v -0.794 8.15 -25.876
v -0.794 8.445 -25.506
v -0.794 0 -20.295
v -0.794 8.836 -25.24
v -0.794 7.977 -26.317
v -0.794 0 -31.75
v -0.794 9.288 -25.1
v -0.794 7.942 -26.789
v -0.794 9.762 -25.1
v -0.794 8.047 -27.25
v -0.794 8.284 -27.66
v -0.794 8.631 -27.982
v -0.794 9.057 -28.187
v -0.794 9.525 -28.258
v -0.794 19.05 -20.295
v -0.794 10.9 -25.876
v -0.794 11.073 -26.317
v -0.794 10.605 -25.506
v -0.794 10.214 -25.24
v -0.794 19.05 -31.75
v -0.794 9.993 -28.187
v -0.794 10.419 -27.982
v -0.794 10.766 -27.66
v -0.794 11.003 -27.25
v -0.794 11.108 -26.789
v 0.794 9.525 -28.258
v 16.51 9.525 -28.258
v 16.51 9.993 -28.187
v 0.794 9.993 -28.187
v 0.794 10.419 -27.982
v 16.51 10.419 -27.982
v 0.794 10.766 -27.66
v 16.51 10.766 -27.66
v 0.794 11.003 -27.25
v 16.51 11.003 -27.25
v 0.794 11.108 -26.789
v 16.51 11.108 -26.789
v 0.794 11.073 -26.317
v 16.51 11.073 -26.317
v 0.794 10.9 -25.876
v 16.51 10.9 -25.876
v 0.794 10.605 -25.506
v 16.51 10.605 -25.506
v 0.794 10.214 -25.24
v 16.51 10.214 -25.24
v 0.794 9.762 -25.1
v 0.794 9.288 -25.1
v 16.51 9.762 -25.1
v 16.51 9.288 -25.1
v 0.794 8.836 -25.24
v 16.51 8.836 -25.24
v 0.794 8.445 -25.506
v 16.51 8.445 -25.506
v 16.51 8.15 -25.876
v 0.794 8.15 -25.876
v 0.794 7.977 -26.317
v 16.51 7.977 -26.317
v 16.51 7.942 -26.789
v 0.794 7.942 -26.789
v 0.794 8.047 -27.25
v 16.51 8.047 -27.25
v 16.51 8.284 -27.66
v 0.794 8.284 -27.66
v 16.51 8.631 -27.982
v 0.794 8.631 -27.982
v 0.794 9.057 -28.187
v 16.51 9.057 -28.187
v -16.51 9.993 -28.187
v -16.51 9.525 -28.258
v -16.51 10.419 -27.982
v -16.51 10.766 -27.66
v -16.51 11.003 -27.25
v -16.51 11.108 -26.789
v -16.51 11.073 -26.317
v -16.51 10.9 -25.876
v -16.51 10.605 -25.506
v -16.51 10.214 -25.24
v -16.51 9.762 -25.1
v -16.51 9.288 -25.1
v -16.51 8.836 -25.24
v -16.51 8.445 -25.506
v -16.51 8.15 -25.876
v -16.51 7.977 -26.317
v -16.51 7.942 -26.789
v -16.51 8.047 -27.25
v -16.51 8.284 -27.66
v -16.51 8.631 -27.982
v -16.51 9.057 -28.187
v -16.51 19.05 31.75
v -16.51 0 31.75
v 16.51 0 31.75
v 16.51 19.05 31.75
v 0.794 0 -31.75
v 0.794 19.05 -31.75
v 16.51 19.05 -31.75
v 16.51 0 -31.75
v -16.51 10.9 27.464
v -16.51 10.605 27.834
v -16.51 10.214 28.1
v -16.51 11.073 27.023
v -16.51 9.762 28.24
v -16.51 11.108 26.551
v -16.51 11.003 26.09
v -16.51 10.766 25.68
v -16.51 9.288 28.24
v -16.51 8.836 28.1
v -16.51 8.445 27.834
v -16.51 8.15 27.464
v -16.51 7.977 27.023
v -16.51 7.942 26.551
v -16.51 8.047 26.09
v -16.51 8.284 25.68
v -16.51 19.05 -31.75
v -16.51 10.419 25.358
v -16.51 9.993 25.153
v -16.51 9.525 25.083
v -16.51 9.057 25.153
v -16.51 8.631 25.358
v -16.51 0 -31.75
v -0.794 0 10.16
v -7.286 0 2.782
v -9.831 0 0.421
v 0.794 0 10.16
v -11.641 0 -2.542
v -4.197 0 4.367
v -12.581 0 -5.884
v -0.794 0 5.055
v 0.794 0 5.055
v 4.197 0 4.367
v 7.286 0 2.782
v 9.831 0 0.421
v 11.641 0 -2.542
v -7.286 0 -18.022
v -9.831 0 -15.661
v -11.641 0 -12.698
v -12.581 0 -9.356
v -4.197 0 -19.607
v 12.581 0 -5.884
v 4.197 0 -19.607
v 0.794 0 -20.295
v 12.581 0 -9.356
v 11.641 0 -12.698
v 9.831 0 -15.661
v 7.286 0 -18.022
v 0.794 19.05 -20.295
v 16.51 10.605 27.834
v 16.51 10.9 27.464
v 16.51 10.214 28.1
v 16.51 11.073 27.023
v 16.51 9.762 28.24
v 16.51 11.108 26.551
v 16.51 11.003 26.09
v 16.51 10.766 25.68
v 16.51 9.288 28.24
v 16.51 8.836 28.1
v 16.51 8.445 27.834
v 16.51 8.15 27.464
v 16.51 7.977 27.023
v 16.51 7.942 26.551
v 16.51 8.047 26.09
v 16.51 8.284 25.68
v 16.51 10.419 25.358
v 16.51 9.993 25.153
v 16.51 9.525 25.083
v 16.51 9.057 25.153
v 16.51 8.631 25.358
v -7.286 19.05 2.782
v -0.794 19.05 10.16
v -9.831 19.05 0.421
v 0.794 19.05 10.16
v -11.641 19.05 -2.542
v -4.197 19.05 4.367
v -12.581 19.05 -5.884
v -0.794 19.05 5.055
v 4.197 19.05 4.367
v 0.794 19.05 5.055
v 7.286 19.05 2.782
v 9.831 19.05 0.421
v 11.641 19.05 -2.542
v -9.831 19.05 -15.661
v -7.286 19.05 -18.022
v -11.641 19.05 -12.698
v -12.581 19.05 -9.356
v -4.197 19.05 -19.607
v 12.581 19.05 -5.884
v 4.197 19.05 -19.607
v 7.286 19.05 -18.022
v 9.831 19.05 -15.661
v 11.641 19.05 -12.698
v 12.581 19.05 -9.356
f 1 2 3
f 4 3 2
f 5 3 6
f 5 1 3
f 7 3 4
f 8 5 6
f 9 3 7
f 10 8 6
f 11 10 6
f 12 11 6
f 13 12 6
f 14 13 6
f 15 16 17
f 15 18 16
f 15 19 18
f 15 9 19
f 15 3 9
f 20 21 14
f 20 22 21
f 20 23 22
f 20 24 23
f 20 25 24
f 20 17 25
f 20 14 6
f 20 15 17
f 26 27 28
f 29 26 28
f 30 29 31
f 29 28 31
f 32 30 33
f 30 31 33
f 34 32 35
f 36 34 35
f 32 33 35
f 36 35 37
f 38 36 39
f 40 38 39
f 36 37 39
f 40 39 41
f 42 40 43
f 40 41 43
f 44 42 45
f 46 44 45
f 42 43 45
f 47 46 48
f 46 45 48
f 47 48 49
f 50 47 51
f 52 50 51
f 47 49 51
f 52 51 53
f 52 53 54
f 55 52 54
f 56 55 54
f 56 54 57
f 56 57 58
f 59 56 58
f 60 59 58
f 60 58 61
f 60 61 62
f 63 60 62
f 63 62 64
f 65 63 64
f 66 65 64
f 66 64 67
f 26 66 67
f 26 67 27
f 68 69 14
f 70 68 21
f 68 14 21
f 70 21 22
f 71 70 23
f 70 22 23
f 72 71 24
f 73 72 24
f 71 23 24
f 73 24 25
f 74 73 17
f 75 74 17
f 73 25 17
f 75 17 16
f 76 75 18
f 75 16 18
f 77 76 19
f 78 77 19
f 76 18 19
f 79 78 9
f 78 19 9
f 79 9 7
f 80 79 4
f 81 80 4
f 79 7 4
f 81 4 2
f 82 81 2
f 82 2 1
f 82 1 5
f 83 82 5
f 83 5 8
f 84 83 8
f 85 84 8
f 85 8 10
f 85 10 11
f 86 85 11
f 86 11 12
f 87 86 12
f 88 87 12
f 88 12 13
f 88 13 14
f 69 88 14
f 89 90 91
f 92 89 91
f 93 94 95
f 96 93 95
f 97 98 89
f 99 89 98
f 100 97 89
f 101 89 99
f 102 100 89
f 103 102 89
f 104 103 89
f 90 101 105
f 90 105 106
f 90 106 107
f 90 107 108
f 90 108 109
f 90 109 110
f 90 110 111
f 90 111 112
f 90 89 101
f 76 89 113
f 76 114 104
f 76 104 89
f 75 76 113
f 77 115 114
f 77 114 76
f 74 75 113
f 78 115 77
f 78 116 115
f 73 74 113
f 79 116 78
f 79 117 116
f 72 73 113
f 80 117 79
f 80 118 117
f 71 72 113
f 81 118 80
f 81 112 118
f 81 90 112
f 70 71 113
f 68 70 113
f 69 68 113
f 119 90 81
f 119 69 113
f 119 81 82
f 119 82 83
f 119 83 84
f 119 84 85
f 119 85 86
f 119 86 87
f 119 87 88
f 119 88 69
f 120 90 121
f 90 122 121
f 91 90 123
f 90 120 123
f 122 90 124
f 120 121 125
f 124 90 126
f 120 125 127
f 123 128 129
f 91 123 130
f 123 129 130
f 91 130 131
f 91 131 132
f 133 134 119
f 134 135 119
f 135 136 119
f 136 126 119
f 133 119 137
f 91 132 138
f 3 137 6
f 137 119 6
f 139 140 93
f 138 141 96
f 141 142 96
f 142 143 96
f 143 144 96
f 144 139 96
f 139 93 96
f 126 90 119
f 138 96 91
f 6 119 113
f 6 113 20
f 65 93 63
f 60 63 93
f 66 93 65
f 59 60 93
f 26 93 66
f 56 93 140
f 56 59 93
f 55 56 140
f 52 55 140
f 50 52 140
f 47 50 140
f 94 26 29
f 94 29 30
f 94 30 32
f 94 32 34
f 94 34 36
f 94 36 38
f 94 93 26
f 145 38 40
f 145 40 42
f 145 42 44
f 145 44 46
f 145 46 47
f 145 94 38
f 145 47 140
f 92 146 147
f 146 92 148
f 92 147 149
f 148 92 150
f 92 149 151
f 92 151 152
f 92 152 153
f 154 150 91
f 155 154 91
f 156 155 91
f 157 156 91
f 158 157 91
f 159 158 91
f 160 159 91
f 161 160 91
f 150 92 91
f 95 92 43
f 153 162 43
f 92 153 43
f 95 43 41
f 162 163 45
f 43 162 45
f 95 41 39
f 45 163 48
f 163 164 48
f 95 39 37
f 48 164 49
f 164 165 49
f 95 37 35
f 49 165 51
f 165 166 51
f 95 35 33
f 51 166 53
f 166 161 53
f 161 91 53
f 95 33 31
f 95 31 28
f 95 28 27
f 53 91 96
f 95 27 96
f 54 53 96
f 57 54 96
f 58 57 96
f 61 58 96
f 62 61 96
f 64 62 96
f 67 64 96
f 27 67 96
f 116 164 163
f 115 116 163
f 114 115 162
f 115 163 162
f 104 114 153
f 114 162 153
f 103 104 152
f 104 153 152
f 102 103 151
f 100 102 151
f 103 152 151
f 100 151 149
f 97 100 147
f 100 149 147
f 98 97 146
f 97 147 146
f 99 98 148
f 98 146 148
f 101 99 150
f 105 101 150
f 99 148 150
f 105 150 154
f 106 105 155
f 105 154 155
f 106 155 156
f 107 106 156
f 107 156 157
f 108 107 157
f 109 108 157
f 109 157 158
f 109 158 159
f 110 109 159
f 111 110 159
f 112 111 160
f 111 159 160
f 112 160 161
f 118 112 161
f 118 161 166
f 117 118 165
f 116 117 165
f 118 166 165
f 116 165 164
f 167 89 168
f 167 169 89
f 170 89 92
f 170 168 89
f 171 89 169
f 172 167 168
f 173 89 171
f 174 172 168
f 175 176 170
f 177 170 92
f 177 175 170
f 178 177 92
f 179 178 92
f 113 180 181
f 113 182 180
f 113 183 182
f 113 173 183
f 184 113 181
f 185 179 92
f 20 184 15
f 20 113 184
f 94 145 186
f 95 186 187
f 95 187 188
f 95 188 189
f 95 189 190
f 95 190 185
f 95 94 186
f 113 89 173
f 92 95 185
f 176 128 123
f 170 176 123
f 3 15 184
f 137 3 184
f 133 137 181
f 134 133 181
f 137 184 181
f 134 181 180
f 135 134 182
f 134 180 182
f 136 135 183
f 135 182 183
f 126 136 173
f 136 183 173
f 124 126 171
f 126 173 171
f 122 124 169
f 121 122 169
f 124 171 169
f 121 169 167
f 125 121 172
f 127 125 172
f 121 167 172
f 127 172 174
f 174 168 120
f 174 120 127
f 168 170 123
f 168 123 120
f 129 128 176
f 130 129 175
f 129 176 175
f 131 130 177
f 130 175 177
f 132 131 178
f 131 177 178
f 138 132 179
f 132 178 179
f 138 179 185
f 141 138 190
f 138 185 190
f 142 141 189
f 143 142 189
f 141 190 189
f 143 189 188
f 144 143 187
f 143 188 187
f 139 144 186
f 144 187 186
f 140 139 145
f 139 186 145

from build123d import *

# Parameters (mm, degrees)
SKETCH1_W           = 33.02
SKETCH1_H           = 63.5
BOSS_EXTRUDE1_DEPTH = 19.05
CUT_EXTRUDE1_DEPTH  = 19.05
SKETCH3_R           = 12.7
CUT_EXTRUDE2_DEPTH  = 19.05
SKETCH4_R           = 1.5875
CUT_EXTRUDE3_DEPTH  = 33.02


with BuildPart() as part:
    # Sketch1 → Boss-Extrude1 (new body)
    with BuildSketch(Plane(origin=(0, 0, 0), x_dir=(1, 0, 0), z_dir=(0, 1, 0))):
        Rectangle(SKETCH1_W, SKETCH1_H)
    extrude(amount=BOSS_EXTRUDE1_DEPTH)

    # Sketch2 → Cut-Extrude1 (cut)
    with BuildSketch(Plane(origin=(0, 19.05, 0), x_dir=(1, 0, 0), z_dir=(0, 1, 0))):
        Polygon((0, 31.75), (0.79375, 31.75), (0.79375, -10.16), (-0.79375, -10.16), (-0.79375, 31.75), align=None)
    extrude(amount=-CUT_EXTRUDE1_DEPTH, mode=Mode.SUBTRACT)

    # Sketch3 → Cut-Extrude2 (cut)
    with BuildSketch(Plane(origin=(0, 19.05, 0), x_dir=(1, 0, 0), z_dir=(0, 1, 0))):
        with Locations((0, 7.62)):
            Circle(SKETCH3_R)
    extrude(amount=-CUT_EXTRUDE2_DEPTH, mode=Mode.SUBTRACT)

    # Sketch4 → Cut-Extrude3 (cut)
    with BuildSketch(Plane(origin=(16.51, 0, 0), x_dir=(0, 0, -1), z_dir=(1, 0, 0))):
        with Locations((-26.67, 9.525)):
            Circle(SKETCH4_R)
        with Locations((26.67, 9.525)):
            Circle(SKETCH4_R)
    extrude(amount=-CUT_EXTRUDE3_DEPTH, mode=Mode.SUBTRACT)


solid = part.part
